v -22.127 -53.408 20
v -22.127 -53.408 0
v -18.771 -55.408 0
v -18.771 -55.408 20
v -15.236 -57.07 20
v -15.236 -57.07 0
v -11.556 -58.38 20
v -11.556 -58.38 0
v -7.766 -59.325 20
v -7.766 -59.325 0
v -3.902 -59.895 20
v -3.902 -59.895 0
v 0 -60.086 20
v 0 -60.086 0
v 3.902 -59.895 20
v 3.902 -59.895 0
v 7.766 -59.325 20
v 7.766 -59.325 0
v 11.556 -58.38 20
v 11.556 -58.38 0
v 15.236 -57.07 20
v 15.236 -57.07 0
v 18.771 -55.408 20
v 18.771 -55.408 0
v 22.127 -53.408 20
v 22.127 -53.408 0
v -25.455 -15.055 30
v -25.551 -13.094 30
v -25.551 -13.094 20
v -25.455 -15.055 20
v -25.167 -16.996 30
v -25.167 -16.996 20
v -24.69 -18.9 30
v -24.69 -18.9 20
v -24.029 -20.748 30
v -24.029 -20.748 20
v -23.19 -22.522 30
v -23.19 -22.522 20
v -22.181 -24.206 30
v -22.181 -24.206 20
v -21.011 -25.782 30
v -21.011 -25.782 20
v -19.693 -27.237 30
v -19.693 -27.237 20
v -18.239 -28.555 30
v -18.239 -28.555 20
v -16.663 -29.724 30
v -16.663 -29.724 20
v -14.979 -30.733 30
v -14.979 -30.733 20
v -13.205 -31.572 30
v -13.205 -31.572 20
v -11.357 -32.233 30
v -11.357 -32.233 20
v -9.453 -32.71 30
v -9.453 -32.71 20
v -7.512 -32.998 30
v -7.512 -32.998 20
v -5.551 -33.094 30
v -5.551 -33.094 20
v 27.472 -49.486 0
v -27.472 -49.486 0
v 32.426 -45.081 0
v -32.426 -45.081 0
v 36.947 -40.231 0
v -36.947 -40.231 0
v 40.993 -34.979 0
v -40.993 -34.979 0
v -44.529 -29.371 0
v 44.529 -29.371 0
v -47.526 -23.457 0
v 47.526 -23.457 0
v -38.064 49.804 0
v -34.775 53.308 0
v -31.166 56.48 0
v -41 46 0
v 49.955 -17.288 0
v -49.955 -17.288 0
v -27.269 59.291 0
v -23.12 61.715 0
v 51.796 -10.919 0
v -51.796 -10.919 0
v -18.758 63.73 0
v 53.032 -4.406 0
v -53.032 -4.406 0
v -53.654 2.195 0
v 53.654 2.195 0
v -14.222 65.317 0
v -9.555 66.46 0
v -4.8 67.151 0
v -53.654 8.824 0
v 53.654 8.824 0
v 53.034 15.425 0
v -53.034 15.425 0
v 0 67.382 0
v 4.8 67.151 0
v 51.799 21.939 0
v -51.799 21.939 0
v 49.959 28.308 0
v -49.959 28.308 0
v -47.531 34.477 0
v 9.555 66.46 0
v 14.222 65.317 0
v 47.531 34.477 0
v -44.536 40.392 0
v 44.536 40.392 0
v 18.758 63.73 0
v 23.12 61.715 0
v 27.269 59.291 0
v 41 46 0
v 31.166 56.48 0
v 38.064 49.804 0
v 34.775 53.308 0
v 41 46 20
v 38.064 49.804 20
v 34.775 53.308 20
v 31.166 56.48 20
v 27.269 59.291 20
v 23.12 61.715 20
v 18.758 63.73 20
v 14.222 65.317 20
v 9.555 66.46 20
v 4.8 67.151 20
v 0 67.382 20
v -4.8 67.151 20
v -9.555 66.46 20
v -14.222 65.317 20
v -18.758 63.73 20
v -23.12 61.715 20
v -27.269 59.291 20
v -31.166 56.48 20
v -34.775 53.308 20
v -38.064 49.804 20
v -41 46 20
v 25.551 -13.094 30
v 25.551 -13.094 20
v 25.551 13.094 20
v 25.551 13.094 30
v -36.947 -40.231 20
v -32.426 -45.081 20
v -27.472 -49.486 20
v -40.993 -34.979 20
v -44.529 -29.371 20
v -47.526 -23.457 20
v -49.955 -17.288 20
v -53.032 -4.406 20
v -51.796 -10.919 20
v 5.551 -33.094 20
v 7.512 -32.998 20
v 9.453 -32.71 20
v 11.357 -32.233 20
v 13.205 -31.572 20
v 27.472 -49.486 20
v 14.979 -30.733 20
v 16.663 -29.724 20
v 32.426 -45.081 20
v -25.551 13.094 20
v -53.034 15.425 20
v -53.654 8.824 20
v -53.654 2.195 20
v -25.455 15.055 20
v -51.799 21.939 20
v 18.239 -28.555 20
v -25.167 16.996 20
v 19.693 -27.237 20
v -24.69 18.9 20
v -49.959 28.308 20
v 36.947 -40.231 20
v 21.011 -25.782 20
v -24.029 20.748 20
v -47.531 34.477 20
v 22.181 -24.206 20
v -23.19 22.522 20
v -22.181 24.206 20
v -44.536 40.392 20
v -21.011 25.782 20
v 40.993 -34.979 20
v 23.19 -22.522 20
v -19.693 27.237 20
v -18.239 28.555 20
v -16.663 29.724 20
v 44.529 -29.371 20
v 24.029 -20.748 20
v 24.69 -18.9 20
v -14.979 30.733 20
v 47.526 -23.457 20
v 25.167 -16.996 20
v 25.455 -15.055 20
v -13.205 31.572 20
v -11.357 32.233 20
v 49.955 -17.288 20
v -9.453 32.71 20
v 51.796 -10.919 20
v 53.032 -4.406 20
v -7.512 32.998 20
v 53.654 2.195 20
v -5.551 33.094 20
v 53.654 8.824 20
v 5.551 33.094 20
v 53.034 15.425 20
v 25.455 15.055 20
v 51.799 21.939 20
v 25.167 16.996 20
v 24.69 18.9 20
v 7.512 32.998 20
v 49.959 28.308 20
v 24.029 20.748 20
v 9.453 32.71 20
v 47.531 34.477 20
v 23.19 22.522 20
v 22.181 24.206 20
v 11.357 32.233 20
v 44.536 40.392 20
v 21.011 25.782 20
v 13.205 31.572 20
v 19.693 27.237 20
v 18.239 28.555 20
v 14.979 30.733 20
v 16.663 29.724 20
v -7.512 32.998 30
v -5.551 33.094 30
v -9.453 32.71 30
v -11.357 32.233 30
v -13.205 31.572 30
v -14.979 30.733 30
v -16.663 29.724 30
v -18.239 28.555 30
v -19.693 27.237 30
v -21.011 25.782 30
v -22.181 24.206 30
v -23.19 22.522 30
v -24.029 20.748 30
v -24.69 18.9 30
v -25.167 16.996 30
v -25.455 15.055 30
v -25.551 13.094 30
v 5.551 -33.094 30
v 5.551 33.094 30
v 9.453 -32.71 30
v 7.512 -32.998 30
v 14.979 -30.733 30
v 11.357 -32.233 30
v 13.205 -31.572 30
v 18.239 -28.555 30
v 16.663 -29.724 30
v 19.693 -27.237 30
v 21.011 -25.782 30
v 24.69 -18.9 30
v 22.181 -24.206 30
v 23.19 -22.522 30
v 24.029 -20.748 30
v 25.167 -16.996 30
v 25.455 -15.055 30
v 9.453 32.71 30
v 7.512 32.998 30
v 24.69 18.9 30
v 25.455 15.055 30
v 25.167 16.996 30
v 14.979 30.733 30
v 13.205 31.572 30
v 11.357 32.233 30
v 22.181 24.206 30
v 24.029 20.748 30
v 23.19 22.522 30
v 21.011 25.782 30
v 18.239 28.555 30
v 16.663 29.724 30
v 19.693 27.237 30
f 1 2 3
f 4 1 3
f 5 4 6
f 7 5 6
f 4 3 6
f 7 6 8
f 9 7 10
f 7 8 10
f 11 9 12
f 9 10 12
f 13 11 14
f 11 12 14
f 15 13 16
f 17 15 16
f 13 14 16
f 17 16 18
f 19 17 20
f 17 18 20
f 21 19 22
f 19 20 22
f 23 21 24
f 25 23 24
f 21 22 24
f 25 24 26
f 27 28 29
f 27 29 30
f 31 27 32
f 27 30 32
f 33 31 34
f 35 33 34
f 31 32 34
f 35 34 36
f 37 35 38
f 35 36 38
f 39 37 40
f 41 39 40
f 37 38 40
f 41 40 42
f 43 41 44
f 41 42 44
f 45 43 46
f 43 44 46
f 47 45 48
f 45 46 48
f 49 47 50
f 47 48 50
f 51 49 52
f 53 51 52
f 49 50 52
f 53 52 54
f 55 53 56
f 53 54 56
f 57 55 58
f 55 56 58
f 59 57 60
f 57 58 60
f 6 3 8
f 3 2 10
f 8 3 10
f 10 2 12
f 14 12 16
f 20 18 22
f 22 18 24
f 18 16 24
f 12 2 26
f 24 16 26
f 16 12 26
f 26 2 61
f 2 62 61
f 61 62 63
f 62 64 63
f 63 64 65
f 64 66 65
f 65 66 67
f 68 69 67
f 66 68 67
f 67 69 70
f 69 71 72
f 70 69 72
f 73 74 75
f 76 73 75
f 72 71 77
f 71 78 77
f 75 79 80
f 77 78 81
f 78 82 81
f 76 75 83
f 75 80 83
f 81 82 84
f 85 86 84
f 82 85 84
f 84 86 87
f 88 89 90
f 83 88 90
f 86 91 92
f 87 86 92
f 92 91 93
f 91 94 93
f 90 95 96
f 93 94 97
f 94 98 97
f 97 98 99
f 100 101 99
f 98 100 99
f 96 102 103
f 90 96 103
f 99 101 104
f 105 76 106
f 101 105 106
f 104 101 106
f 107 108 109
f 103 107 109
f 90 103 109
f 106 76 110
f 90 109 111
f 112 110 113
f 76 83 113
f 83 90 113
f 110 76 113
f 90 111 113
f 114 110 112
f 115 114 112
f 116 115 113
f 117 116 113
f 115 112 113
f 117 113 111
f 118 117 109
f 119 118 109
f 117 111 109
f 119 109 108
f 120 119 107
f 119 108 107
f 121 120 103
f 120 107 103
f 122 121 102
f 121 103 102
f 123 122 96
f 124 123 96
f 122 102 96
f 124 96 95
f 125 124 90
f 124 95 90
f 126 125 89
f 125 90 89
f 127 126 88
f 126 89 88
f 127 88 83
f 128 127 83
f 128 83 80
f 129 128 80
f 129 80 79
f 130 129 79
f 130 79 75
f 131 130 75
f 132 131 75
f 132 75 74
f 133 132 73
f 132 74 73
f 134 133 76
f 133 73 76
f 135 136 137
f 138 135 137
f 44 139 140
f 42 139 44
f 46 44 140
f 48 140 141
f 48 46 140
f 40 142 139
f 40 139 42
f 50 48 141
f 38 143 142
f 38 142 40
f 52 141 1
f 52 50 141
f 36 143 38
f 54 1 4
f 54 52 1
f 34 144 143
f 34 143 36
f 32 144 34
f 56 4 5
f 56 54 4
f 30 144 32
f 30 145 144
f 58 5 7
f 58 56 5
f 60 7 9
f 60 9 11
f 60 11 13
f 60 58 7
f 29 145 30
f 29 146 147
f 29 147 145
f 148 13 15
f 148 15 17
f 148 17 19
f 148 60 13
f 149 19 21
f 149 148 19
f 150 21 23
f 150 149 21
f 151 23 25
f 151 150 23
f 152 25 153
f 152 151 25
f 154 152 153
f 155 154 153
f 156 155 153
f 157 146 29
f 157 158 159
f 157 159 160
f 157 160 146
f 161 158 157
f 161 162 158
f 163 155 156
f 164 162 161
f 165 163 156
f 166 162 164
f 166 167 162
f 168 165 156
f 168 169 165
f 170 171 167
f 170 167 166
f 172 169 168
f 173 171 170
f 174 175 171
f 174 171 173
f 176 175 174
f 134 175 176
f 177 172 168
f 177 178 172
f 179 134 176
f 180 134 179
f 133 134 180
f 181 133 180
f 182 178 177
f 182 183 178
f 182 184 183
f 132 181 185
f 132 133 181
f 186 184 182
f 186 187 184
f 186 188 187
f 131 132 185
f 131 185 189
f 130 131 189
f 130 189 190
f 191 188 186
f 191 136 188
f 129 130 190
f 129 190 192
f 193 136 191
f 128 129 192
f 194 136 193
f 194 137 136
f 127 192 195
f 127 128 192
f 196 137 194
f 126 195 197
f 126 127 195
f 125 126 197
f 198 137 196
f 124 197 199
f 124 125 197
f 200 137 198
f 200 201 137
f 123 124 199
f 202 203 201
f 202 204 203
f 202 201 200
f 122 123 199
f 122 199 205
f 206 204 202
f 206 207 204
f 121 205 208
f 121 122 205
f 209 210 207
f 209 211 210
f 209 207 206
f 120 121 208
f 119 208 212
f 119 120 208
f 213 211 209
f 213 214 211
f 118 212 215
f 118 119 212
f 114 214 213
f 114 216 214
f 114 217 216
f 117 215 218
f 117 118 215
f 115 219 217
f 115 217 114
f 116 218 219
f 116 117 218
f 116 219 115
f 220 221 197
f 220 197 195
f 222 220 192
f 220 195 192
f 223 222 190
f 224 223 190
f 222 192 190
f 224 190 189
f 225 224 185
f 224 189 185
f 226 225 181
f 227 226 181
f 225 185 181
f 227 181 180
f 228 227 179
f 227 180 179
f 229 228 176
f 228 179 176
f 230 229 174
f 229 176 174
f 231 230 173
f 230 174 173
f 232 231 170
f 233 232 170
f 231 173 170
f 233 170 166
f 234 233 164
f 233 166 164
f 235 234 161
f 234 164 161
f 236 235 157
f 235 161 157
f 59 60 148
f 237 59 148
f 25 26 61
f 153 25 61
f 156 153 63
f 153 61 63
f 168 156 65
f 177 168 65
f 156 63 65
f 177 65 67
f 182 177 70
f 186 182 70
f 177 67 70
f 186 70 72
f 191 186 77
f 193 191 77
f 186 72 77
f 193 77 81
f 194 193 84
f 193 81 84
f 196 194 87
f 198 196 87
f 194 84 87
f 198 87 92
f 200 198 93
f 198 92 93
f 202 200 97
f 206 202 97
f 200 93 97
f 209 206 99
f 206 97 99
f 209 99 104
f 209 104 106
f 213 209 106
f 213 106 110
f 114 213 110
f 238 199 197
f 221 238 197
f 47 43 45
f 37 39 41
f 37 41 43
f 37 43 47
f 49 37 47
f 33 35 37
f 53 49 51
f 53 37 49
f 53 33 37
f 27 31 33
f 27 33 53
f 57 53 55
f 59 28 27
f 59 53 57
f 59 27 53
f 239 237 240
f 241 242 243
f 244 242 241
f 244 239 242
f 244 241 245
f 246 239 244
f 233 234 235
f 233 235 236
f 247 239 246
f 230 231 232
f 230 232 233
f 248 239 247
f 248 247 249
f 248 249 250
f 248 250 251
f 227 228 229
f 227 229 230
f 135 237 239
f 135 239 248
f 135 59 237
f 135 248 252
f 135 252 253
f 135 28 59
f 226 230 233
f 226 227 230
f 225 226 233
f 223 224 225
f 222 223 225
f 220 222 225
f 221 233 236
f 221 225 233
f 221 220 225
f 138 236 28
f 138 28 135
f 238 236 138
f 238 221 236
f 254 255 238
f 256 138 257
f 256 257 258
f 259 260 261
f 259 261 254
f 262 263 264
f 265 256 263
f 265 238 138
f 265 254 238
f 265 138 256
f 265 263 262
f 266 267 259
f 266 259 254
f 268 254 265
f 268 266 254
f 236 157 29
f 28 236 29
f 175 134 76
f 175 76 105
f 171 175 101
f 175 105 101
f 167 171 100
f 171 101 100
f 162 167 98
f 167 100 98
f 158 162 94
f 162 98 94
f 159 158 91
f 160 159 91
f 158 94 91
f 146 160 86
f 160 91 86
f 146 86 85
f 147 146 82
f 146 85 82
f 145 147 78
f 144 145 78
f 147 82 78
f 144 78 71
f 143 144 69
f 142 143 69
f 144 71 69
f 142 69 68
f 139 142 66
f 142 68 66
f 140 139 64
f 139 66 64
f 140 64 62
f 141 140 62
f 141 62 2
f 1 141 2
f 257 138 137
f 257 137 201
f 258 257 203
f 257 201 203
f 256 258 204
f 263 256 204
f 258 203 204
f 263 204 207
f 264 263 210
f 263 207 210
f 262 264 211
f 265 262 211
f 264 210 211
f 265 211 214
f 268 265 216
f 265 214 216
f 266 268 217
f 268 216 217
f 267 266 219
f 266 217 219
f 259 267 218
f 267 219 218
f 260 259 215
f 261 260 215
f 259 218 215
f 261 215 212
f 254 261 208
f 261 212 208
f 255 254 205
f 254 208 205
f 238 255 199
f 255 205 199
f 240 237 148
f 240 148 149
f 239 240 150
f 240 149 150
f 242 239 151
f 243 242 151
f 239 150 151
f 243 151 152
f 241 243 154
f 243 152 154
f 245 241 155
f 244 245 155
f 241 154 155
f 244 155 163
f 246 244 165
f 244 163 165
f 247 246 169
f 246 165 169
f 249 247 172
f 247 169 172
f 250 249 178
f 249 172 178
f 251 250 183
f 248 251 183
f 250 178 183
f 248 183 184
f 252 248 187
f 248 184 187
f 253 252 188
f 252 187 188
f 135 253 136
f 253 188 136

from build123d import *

# Parameters (mm, degrees)
F1_DEPTH = 20
F3_DEPTH = 10


with BuildPart() as f1:
    # F0 (on Top) → F1 (new body)
    with BuildSketch(Plane.XY):
        with BuildLine():
            ThreePointArc((-22.126984, -53.408383), (0, -60.085769), (22.126984, -53.408383))
            ThreePointArc((22.126984, -53.408383), (52.490427, -7.67724), (41, 46))
            ThreePointArc((41, 46), (0, 67.381824), (-41, 46))
            ThreePointArc((-41, 46), (-52.490427, -7.67724), (-22.126984, -53.408383))
        make_face()
    extrude(amount=F1_DEPTH)

    # F2 (on face) → F3 (join)
    with BuildSketch(Plane.XY.offset(20)):
        with BuildLine():
            ThreePointArc((25.551237, 13.094417), (19.693373, 27.236553), (5.551237, 33.094417))
            Line((5.551237, 33.094417), (-5.551237, 33.094417))
            ThreePointArc((-5.551237, 33.094417), (-19.693373, 27.236553), (-25.551237, 13.094417))
            Line((-25.551237, 13.094417), (-25.551237, -13.094417))
            ThreePointArc((-25.551237, -13.094417), (-19.693373, -27.236553), (-5.551237, -33.094417))
            Line((-5.551237, -33.094417), (5.551237, -33.094417))
            ThreePointArc((5.551237, -33.094417), (19.693373, -27.236553), (25.551237, -13.094417))
            Line((25.551237, -13.094417), (25.551237, 13.094417))
        make_face()
    extrude(amount=F3_DEPTH)


solid = f1.part
